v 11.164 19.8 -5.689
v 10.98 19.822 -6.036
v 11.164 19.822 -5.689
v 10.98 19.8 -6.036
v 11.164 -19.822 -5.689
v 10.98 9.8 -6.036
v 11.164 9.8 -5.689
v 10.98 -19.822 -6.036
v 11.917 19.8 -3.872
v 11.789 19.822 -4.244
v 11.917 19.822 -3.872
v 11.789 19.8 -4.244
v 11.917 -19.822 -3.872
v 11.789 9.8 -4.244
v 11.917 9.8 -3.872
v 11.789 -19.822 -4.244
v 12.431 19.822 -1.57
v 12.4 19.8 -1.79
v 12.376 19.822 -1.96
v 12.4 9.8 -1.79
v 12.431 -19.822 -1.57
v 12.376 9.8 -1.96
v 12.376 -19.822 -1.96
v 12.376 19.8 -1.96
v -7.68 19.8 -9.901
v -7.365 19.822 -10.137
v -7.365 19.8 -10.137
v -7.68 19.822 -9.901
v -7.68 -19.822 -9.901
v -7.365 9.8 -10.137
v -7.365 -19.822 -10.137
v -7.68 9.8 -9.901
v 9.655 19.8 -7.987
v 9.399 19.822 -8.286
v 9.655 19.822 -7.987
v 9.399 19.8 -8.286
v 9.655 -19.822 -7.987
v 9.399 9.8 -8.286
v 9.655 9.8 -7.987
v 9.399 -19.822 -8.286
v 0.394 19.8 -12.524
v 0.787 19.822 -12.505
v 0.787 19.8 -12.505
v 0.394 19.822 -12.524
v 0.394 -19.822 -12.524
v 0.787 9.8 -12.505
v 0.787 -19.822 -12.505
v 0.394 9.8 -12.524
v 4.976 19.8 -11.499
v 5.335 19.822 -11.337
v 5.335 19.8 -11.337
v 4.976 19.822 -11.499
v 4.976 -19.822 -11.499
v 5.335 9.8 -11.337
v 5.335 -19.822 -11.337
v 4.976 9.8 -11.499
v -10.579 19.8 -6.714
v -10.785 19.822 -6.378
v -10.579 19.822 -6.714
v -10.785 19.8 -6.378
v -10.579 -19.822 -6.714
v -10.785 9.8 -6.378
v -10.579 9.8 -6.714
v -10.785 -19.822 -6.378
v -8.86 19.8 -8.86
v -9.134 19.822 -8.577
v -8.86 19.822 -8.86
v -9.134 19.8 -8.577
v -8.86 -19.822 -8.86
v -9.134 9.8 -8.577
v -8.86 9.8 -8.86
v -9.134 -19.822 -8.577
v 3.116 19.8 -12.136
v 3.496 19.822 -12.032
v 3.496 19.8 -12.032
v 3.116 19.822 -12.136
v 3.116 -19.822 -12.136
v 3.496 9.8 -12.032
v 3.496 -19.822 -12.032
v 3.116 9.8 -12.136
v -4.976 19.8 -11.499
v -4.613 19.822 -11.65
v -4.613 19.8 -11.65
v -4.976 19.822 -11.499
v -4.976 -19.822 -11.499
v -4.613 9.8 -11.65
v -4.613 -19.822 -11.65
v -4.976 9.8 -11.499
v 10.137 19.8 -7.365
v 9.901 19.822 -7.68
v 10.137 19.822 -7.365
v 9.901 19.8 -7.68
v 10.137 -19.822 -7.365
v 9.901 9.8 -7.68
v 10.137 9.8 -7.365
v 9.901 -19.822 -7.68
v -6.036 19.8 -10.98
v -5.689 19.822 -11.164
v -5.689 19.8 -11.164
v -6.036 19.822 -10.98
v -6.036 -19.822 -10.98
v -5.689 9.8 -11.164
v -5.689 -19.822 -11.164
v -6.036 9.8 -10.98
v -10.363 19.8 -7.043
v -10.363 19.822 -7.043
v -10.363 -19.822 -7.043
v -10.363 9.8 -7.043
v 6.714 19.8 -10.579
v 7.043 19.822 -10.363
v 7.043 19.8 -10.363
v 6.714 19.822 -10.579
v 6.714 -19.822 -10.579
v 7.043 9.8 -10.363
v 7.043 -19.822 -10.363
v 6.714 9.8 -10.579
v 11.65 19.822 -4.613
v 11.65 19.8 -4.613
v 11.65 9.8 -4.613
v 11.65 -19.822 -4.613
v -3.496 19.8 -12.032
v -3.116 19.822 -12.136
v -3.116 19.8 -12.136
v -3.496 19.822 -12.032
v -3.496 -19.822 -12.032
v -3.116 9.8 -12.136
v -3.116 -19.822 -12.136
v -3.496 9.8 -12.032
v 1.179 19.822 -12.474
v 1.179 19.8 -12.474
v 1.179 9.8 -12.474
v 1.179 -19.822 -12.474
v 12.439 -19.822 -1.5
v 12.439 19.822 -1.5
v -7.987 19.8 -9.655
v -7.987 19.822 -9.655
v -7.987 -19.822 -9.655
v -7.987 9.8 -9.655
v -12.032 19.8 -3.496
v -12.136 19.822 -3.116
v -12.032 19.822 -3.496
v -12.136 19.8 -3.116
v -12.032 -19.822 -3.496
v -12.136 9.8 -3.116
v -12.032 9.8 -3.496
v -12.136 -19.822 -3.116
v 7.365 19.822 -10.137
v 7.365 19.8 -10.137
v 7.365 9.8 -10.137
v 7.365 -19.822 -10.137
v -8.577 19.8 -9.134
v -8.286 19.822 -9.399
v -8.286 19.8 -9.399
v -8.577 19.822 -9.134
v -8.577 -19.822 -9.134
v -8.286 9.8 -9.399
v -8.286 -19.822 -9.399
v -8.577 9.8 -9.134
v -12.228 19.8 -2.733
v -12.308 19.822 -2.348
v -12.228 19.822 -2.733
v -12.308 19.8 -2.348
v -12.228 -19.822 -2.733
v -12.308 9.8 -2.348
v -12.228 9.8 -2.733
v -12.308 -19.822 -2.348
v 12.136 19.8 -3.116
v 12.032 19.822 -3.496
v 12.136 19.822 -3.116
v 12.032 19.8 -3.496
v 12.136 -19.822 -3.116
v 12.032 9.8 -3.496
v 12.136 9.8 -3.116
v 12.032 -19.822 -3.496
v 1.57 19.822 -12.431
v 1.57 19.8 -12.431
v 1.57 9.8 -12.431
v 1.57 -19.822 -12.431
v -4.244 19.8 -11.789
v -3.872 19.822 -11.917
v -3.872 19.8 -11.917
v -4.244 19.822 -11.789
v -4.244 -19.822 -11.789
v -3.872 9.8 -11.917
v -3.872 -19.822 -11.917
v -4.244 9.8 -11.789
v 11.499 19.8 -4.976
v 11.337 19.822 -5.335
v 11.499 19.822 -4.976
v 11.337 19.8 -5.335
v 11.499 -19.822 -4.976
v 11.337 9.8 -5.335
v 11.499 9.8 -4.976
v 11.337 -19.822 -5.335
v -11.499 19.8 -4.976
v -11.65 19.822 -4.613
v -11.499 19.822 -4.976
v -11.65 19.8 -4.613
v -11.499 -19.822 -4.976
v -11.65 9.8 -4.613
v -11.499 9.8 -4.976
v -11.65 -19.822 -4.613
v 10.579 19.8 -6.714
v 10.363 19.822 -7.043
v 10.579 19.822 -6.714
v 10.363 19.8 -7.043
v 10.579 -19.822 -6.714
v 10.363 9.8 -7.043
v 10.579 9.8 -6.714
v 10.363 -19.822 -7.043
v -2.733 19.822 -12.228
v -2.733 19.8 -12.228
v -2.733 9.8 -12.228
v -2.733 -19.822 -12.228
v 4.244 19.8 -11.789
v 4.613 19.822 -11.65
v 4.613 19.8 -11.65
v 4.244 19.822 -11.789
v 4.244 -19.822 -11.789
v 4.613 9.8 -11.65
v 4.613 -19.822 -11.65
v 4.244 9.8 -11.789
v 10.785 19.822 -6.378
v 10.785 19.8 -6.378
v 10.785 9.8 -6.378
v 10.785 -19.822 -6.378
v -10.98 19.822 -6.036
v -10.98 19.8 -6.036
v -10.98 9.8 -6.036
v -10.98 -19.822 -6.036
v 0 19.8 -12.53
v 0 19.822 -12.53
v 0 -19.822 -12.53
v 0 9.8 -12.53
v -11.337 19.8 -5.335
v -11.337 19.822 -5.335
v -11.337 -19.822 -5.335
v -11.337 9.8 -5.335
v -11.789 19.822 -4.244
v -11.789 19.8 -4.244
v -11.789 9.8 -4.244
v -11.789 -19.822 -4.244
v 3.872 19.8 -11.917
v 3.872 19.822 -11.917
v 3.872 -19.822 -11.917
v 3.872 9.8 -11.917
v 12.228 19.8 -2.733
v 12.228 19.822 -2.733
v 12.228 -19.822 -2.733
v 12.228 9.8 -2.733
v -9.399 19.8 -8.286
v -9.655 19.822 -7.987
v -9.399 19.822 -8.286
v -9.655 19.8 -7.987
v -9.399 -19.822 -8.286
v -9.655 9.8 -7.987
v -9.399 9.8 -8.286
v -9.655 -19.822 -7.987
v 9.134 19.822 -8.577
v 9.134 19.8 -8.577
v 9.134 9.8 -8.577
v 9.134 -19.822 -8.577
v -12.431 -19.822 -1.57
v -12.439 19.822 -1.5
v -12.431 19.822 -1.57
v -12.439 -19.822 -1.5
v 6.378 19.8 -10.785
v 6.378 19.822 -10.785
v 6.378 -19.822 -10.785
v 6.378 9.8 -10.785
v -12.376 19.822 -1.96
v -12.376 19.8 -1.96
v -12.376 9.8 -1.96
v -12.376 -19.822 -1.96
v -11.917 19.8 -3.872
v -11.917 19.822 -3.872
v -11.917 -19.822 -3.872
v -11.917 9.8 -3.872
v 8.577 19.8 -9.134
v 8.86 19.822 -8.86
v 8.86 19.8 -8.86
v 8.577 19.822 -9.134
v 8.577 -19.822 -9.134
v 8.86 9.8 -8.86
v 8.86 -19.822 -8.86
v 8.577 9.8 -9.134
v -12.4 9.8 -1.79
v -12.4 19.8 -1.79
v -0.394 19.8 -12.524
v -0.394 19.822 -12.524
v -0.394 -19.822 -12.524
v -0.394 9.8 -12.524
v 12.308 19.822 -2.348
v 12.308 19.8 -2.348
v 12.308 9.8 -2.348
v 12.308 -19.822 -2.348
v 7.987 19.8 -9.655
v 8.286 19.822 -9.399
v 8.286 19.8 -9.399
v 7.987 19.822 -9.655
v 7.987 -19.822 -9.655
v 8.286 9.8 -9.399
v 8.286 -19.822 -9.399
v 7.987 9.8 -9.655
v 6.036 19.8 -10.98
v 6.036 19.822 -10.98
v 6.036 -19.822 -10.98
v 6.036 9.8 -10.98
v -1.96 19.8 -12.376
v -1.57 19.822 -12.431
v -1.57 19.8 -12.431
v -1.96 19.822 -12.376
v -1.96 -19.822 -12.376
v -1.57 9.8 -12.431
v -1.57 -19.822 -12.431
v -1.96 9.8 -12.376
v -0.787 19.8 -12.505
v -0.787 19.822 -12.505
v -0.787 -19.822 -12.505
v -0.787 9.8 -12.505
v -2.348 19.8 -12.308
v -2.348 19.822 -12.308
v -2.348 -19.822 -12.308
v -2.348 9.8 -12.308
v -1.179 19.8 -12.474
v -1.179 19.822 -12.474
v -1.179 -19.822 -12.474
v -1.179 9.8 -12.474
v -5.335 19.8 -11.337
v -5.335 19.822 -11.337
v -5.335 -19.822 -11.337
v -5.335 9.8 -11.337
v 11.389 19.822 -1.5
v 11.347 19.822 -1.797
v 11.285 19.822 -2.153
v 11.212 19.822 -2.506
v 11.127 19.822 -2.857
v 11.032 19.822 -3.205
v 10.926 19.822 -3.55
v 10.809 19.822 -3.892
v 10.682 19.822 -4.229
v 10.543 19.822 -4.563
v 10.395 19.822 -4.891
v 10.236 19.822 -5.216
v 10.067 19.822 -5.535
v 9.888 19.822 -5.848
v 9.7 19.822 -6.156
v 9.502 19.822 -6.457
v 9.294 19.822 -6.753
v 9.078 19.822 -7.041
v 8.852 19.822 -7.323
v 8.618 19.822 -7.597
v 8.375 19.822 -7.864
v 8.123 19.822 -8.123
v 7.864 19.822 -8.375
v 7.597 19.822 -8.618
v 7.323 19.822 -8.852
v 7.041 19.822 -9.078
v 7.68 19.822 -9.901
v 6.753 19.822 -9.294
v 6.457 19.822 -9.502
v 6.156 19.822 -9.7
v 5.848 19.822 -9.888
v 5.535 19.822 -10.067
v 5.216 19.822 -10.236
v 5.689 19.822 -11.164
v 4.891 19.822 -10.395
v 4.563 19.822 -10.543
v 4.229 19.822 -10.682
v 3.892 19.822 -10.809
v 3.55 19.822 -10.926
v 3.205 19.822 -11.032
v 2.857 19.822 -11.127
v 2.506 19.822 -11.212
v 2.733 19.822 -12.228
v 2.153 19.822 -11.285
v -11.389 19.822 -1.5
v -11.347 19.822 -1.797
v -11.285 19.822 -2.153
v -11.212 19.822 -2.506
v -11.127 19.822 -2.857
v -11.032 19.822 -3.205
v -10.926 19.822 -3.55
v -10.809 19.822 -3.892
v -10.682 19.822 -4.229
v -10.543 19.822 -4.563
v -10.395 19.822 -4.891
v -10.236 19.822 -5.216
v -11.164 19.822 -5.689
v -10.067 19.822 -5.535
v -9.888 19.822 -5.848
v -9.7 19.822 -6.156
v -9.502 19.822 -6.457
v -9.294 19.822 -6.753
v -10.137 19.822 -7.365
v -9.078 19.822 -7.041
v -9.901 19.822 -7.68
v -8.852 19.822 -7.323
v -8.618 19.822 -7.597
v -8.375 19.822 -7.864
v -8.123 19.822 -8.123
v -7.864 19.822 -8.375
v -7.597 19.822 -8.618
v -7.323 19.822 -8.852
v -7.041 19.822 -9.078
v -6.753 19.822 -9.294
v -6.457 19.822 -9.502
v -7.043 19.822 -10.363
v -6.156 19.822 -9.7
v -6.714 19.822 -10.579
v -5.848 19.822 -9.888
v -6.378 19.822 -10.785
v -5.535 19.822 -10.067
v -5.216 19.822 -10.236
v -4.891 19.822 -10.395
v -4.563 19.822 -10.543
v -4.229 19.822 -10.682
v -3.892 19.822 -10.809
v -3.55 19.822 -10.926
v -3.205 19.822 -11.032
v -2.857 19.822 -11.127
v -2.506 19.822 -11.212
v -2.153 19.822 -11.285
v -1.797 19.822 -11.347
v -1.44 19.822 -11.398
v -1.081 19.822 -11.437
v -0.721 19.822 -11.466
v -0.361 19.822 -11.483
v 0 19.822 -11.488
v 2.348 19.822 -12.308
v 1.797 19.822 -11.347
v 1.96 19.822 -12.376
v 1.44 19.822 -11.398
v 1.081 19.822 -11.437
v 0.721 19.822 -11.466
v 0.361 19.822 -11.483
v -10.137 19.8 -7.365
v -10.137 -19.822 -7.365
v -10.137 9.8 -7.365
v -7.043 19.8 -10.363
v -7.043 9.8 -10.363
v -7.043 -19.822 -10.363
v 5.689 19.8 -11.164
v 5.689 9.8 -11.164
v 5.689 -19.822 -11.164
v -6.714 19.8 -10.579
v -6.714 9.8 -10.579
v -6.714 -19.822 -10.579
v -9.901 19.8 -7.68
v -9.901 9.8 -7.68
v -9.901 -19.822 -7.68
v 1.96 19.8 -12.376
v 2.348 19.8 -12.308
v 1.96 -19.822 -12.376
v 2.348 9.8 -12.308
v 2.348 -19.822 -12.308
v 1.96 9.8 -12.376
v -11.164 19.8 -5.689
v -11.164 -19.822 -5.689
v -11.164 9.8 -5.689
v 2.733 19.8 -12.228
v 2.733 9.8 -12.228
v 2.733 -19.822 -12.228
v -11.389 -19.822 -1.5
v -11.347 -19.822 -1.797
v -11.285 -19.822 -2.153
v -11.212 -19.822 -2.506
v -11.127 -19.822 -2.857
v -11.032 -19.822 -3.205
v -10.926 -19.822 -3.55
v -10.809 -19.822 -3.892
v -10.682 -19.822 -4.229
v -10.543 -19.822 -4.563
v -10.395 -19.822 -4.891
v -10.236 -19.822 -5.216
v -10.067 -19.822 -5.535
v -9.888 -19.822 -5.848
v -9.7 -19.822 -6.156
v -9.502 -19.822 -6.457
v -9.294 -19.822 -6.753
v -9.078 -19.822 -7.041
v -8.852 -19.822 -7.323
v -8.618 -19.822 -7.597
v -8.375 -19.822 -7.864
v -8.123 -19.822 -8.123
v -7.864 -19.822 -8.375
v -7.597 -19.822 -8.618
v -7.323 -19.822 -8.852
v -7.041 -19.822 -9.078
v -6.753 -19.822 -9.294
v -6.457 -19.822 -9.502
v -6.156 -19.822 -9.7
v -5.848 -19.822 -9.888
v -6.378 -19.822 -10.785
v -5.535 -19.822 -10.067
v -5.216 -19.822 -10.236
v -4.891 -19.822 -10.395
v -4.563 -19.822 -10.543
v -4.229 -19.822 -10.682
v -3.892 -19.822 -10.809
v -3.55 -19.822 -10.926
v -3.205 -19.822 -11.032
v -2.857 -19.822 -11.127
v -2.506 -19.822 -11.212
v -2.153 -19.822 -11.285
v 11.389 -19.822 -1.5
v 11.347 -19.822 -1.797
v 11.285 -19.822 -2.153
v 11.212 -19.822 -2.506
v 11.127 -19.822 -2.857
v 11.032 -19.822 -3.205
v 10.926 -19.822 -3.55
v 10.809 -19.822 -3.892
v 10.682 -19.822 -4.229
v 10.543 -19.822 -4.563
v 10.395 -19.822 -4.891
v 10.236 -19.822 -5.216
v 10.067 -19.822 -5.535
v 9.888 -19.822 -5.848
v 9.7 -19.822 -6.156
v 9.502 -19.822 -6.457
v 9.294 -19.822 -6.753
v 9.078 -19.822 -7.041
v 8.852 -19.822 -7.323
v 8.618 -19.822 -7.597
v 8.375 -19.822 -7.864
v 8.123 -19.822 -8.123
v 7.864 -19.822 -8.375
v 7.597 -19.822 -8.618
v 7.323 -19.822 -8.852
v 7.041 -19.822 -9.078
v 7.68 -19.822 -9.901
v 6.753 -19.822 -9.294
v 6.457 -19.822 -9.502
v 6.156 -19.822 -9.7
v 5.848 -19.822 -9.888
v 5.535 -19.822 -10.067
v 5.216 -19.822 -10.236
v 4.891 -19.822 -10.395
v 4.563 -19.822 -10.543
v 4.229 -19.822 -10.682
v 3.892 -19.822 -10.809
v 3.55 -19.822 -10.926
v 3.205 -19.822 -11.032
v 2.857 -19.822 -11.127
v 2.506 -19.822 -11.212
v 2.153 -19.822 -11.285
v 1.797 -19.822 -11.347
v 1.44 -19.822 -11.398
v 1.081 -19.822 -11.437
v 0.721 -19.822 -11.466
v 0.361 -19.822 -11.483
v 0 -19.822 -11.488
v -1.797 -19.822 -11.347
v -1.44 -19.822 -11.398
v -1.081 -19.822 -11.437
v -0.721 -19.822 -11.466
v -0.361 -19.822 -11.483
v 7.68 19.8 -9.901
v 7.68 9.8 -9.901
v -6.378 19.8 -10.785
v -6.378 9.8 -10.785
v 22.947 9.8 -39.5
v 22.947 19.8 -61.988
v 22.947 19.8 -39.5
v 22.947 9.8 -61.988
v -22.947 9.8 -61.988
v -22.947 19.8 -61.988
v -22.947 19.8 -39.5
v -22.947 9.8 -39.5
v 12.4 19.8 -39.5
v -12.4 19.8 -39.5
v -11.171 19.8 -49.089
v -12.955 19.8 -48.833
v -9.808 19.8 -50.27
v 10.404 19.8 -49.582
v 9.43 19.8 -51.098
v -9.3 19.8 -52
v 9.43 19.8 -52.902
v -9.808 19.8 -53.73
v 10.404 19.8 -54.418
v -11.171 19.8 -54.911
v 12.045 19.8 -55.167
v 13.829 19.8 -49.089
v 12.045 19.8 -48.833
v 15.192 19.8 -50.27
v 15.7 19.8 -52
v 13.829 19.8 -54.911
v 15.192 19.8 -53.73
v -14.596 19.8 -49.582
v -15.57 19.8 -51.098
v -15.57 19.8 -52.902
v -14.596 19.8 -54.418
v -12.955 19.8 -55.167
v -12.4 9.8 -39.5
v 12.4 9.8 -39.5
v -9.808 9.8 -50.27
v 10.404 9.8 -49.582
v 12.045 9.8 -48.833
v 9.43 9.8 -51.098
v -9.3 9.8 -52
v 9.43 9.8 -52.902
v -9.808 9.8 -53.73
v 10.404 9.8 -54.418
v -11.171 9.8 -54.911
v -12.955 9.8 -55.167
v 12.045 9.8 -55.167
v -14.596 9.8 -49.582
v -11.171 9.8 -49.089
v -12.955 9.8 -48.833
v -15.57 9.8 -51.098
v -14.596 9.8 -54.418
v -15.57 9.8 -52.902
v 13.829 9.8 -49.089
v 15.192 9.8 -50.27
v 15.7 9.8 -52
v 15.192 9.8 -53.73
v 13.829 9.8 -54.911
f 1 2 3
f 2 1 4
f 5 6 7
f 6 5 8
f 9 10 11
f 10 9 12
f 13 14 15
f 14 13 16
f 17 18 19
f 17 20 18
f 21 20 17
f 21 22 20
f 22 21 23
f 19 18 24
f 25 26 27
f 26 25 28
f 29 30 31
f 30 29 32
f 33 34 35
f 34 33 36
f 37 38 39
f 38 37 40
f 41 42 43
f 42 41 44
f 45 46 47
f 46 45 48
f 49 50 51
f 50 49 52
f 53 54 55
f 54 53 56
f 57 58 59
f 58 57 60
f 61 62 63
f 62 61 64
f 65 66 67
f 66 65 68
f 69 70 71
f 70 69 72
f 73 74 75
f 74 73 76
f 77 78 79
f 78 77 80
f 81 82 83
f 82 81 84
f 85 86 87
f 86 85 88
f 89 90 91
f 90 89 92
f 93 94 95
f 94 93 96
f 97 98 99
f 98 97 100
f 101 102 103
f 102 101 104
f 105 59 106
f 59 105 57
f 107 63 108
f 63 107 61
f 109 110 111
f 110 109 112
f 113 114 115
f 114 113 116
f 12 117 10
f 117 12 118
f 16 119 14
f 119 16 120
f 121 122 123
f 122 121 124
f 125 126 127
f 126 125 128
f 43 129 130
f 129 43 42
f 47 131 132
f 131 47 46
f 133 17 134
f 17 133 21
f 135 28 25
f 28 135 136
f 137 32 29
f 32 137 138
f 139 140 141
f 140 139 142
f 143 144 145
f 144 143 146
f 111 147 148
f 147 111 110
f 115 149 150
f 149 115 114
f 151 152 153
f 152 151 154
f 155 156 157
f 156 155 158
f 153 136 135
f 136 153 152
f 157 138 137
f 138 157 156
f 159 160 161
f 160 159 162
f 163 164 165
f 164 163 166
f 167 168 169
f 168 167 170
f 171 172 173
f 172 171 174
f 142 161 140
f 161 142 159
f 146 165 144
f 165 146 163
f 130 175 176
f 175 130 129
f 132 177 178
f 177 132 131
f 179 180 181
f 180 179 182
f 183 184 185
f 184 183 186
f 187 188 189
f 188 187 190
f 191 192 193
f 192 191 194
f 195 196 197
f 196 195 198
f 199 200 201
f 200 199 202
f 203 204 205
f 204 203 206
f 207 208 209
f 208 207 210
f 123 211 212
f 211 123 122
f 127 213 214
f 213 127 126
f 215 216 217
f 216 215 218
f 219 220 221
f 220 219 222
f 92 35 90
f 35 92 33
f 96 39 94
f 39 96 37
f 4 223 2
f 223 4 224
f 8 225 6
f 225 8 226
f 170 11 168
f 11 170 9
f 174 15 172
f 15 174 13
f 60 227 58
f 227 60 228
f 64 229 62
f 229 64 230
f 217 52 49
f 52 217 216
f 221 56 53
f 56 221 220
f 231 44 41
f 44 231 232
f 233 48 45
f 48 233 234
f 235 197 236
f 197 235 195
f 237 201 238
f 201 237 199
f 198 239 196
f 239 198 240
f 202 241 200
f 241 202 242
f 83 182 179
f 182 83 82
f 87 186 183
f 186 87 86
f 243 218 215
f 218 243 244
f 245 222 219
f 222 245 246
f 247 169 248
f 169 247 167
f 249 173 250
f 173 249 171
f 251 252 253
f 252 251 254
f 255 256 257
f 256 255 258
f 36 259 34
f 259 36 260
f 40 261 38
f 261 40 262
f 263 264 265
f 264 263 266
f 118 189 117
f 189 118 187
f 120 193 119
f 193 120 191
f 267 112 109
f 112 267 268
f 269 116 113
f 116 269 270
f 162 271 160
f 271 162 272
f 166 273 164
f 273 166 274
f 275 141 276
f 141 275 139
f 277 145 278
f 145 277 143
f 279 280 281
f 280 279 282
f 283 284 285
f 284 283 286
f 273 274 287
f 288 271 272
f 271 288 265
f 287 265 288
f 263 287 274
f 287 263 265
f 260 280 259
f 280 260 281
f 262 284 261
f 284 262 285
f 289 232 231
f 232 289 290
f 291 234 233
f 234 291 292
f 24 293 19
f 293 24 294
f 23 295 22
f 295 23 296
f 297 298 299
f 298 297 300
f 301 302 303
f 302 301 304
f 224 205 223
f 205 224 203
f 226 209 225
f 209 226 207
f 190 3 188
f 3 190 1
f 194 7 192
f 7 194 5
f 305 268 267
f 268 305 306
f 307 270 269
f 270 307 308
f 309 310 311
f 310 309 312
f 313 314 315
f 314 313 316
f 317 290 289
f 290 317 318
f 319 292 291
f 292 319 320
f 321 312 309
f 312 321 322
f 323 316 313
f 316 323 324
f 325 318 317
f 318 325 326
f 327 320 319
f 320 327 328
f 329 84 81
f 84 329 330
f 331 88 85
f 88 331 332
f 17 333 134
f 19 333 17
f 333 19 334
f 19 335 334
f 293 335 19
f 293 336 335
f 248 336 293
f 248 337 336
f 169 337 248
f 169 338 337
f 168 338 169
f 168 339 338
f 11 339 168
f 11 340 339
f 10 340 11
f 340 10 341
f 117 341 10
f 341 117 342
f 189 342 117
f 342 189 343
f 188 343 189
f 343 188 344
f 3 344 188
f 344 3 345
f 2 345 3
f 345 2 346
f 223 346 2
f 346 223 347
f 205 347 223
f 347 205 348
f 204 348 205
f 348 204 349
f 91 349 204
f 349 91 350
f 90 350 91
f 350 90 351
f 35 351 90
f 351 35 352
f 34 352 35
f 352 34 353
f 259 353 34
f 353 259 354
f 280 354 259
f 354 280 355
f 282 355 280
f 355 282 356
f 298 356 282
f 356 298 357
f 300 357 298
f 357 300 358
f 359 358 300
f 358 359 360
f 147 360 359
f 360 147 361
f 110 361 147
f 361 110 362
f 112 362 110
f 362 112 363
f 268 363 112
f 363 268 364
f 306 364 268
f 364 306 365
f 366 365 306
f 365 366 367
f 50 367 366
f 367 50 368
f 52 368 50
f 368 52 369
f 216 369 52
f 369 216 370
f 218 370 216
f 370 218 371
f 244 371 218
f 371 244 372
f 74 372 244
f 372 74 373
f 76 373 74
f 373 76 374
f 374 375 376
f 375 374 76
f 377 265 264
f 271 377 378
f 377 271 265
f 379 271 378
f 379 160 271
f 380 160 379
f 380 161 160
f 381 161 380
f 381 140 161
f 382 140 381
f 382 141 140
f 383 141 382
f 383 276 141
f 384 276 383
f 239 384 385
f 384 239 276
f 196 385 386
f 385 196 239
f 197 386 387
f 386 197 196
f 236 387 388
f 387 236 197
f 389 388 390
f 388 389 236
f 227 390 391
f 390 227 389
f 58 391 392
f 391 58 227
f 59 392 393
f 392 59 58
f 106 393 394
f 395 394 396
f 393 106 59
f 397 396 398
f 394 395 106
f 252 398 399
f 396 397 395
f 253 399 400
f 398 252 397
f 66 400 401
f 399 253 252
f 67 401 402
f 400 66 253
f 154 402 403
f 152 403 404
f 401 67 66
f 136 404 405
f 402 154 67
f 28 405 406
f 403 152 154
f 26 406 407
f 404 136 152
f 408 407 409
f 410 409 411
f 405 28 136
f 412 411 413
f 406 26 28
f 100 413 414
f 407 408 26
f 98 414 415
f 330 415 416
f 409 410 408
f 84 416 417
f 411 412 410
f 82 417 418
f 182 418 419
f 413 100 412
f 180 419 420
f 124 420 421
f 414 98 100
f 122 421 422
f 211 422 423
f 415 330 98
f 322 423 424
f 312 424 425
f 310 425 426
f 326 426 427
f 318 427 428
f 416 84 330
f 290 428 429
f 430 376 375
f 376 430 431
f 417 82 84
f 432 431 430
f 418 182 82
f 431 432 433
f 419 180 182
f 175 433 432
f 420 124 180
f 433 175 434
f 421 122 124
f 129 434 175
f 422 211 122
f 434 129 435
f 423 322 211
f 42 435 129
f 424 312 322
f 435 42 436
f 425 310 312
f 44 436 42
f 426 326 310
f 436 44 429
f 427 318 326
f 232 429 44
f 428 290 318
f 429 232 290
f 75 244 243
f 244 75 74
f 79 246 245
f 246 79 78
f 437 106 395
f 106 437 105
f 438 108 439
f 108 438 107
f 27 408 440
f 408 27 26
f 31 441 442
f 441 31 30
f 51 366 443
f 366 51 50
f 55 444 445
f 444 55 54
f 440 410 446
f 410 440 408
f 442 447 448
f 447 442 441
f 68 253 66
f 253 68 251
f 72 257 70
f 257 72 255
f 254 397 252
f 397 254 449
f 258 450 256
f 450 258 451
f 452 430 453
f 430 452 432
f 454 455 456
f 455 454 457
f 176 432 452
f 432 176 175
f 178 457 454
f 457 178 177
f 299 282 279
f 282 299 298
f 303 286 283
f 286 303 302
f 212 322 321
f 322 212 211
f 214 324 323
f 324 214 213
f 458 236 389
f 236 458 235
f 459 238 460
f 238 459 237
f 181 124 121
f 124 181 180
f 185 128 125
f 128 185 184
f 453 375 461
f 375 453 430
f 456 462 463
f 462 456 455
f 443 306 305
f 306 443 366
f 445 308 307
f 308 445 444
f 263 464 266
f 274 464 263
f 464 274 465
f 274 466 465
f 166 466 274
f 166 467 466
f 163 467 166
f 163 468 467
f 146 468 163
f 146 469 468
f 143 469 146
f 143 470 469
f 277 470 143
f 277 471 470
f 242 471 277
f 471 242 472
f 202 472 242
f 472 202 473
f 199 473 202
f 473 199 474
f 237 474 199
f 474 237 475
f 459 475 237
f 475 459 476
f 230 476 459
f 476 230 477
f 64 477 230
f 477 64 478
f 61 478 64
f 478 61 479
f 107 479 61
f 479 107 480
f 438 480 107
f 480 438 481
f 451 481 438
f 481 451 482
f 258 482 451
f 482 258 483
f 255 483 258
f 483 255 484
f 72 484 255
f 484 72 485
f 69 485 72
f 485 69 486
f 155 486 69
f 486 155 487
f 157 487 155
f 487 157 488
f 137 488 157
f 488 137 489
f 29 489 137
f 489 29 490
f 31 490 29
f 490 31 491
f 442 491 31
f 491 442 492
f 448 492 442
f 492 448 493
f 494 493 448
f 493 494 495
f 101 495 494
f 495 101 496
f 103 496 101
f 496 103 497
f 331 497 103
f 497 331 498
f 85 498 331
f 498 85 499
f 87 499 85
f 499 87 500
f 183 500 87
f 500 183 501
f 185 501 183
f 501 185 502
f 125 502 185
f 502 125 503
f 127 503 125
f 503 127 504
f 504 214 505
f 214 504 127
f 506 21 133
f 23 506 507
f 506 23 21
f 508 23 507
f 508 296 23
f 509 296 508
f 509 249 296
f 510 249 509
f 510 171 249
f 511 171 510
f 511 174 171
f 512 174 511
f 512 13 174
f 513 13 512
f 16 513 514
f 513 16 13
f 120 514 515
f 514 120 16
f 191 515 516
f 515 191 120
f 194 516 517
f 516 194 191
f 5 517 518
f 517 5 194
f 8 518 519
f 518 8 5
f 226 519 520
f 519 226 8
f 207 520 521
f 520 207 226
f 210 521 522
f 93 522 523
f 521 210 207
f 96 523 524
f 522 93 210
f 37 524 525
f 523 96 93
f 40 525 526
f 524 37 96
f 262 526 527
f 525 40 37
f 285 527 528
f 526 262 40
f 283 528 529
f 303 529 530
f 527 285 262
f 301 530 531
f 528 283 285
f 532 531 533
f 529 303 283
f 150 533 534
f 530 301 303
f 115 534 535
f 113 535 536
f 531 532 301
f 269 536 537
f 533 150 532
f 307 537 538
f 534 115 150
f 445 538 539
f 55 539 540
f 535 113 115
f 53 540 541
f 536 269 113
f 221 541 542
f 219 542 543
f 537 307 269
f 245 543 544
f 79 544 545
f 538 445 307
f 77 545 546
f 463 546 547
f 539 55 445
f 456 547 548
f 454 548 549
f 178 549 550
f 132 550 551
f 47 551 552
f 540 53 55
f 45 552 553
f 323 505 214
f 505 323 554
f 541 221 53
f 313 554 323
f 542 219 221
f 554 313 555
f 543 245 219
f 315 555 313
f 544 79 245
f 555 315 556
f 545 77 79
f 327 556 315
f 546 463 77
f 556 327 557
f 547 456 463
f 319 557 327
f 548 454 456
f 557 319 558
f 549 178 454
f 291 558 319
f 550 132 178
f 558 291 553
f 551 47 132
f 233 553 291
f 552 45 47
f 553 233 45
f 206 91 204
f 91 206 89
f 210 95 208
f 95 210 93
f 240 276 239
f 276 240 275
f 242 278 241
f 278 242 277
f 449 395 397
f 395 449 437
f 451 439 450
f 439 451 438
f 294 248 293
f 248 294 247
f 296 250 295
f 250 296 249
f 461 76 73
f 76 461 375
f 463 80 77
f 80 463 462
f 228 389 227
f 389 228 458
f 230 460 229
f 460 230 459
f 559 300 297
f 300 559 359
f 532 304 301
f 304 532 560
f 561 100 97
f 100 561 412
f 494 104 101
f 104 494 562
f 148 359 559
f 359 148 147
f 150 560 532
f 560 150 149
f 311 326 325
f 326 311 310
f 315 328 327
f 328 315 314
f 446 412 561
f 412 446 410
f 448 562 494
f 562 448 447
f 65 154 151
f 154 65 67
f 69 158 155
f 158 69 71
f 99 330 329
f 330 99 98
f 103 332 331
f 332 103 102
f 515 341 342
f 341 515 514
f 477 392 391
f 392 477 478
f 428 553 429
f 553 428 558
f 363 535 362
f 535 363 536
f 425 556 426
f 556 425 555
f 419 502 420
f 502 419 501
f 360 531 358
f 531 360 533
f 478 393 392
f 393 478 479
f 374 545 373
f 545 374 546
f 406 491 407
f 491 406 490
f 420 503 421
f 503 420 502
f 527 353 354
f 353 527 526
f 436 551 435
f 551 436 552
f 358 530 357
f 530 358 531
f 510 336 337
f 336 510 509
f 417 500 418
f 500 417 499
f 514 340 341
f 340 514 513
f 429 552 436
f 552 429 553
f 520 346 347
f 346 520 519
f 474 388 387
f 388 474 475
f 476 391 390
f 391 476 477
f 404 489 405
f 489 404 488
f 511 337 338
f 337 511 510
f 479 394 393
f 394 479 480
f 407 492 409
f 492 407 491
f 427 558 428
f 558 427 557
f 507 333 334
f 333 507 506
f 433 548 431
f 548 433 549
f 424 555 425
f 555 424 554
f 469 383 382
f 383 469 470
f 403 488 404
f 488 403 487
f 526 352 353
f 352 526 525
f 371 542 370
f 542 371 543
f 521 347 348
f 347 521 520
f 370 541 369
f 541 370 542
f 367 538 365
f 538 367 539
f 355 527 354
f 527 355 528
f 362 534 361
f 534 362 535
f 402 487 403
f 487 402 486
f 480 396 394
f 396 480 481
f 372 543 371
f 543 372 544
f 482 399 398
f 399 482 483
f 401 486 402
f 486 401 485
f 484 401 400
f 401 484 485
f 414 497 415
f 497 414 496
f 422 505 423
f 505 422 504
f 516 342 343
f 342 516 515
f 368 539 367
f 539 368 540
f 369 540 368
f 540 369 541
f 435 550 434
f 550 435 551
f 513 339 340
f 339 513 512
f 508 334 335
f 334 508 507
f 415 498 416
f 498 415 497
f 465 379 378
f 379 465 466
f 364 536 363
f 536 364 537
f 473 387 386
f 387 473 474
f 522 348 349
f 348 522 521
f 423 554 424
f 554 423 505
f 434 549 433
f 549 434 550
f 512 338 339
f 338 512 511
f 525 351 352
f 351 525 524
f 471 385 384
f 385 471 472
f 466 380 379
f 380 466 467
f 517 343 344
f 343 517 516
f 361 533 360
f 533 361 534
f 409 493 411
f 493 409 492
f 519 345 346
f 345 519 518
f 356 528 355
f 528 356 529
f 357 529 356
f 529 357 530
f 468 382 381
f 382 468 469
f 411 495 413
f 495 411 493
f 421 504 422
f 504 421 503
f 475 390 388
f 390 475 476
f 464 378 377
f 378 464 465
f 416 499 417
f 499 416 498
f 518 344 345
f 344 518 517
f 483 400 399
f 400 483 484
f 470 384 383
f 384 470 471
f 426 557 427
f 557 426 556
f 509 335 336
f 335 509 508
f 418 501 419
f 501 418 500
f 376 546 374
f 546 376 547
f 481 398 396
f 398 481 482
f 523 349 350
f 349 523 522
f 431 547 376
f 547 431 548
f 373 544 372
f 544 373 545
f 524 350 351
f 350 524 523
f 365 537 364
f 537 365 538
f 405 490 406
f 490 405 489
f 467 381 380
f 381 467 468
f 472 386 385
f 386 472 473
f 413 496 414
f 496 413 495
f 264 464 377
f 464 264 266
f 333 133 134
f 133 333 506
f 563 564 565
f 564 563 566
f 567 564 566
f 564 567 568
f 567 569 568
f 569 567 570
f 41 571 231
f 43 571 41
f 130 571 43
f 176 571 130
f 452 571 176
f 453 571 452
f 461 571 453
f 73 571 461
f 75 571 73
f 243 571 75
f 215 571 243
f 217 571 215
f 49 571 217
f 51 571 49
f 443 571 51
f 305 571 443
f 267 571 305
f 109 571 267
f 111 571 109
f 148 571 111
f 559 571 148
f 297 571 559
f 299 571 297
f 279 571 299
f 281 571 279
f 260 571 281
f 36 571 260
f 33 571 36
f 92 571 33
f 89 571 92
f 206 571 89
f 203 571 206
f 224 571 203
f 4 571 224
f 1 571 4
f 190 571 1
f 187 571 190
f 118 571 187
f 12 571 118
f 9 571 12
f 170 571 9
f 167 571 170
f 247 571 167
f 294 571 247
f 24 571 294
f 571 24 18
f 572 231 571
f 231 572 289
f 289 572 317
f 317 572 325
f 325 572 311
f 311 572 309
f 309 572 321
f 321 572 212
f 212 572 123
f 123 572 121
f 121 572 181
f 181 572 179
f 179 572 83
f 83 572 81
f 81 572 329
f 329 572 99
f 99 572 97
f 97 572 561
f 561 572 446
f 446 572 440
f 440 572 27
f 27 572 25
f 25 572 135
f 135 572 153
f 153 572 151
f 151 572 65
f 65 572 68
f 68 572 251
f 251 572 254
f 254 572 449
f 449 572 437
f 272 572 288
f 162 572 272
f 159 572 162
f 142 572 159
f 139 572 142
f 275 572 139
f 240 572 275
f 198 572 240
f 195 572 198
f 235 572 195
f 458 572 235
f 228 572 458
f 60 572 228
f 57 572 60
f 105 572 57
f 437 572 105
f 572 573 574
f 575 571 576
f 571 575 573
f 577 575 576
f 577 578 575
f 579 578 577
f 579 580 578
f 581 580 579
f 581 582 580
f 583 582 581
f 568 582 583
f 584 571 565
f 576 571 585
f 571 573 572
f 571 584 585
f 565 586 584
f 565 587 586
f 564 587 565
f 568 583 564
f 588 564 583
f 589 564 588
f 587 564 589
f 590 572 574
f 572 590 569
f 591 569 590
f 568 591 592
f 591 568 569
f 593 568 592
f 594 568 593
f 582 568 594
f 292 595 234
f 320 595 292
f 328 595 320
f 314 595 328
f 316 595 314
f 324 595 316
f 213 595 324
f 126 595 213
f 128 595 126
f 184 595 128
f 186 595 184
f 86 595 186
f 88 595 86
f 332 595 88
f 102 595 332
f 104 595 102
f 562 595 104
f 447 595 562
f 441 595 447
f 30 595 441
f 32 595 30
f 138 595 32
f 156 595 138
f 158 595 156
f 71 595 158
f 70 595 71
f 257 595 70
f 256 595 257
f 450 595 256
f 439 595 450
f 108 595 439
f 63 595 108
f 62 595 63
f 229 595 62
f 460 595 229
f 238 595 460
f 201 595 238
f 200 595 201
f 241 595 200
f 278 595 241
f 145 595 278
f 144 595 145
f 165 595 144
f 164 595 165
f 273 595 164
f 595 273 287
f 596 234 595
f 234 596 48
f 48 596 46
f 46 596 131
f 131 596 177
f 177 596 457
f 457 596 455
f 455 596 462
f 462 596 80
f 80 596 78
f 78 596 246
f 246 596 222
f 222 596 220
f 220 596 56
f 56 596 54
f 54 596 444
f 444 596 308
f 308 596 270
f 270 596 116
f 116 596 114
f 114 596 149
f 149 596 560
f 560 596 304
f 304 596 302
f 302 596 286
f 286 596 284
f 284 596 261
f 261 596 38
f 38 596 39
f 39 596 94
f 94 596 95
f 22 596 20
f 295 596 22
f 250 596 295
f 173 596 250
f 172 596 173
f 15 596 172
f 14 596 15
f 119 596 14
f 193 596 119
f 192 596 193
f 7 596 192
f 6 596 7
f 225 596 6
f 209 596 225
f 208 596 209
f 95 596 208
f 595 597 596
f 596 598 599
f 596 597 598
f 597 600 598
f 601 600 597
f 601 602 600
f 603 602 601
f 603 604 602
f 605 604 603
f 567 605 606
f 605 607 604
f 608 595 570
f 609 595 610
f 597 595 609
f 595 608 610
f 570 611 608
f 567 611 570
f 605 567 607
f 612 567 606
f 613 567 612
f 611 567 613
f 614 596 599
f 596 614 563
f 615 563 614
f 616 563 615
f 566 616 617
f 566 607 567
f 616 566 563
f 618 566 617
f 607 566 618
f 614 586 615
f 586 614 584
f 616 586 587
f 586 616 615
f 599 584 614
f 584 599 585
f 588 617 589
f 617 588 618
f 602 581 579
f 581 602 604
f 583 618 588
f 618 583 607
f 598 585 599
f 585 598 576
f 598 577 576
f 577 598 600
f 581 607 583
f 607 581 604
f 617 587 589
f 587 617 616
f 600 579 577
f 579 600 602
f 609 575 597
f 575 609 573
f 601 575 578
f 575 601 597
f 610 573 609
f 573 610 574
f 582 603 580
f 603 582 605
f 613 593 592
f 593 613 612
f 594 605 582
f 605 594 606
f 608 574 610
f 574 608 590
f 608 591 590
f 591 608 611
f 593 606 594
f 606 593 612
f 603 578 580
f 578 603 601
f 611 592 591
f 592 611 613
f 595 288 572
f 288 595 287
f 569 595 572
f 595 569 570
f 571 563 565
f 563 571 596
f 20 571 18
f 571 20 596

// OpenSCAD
//printer offsets for Ultimaker 3:
A = 1/0.96;
B = 0.06;


//making the vial holder component 

module cylinder_component(){
    difference(){
    cylinder(d=24*A+B,h=38*A+B,center=true,$fn=200);
    cylinder(d=22*A+B,h=39*A+B,center=true,$fn=200);
    }
}
difference(){
rotate([90,0,0])cylinder_component();
    translate([0,0,6])cube([27,42,15],center=true);
}

module mini_cylinder(){
difference(){
rotate([90,0,0])cylinder(d=24*A+B,h=14,center=true,$fn=200);
    translate([0,0,6])cube([26,42,14],center=true);
}
}

module bracket_connector(){
difference(){
    translate([0,14.80,-31.75])cube([44*A+B,10,58*A+B],center=true);
    translate([0,15,0])mini_cylinder();
}
}

difference(){
bracket_connector();
    translate([12.5,0,-52])rotate([90,0,0])cylinder(d=6.4,h=50,center=true);
    translate([-12.5,0,-52])rotate([90,0,0])cylinder(d=6.4,h=50,center=true);
    translate([-18.4,14.8,-20.5])cube([12,15,38],center=true);
    translate([18.4,14.8,-20.5])cube([12,15,38],center=true);
    
}
